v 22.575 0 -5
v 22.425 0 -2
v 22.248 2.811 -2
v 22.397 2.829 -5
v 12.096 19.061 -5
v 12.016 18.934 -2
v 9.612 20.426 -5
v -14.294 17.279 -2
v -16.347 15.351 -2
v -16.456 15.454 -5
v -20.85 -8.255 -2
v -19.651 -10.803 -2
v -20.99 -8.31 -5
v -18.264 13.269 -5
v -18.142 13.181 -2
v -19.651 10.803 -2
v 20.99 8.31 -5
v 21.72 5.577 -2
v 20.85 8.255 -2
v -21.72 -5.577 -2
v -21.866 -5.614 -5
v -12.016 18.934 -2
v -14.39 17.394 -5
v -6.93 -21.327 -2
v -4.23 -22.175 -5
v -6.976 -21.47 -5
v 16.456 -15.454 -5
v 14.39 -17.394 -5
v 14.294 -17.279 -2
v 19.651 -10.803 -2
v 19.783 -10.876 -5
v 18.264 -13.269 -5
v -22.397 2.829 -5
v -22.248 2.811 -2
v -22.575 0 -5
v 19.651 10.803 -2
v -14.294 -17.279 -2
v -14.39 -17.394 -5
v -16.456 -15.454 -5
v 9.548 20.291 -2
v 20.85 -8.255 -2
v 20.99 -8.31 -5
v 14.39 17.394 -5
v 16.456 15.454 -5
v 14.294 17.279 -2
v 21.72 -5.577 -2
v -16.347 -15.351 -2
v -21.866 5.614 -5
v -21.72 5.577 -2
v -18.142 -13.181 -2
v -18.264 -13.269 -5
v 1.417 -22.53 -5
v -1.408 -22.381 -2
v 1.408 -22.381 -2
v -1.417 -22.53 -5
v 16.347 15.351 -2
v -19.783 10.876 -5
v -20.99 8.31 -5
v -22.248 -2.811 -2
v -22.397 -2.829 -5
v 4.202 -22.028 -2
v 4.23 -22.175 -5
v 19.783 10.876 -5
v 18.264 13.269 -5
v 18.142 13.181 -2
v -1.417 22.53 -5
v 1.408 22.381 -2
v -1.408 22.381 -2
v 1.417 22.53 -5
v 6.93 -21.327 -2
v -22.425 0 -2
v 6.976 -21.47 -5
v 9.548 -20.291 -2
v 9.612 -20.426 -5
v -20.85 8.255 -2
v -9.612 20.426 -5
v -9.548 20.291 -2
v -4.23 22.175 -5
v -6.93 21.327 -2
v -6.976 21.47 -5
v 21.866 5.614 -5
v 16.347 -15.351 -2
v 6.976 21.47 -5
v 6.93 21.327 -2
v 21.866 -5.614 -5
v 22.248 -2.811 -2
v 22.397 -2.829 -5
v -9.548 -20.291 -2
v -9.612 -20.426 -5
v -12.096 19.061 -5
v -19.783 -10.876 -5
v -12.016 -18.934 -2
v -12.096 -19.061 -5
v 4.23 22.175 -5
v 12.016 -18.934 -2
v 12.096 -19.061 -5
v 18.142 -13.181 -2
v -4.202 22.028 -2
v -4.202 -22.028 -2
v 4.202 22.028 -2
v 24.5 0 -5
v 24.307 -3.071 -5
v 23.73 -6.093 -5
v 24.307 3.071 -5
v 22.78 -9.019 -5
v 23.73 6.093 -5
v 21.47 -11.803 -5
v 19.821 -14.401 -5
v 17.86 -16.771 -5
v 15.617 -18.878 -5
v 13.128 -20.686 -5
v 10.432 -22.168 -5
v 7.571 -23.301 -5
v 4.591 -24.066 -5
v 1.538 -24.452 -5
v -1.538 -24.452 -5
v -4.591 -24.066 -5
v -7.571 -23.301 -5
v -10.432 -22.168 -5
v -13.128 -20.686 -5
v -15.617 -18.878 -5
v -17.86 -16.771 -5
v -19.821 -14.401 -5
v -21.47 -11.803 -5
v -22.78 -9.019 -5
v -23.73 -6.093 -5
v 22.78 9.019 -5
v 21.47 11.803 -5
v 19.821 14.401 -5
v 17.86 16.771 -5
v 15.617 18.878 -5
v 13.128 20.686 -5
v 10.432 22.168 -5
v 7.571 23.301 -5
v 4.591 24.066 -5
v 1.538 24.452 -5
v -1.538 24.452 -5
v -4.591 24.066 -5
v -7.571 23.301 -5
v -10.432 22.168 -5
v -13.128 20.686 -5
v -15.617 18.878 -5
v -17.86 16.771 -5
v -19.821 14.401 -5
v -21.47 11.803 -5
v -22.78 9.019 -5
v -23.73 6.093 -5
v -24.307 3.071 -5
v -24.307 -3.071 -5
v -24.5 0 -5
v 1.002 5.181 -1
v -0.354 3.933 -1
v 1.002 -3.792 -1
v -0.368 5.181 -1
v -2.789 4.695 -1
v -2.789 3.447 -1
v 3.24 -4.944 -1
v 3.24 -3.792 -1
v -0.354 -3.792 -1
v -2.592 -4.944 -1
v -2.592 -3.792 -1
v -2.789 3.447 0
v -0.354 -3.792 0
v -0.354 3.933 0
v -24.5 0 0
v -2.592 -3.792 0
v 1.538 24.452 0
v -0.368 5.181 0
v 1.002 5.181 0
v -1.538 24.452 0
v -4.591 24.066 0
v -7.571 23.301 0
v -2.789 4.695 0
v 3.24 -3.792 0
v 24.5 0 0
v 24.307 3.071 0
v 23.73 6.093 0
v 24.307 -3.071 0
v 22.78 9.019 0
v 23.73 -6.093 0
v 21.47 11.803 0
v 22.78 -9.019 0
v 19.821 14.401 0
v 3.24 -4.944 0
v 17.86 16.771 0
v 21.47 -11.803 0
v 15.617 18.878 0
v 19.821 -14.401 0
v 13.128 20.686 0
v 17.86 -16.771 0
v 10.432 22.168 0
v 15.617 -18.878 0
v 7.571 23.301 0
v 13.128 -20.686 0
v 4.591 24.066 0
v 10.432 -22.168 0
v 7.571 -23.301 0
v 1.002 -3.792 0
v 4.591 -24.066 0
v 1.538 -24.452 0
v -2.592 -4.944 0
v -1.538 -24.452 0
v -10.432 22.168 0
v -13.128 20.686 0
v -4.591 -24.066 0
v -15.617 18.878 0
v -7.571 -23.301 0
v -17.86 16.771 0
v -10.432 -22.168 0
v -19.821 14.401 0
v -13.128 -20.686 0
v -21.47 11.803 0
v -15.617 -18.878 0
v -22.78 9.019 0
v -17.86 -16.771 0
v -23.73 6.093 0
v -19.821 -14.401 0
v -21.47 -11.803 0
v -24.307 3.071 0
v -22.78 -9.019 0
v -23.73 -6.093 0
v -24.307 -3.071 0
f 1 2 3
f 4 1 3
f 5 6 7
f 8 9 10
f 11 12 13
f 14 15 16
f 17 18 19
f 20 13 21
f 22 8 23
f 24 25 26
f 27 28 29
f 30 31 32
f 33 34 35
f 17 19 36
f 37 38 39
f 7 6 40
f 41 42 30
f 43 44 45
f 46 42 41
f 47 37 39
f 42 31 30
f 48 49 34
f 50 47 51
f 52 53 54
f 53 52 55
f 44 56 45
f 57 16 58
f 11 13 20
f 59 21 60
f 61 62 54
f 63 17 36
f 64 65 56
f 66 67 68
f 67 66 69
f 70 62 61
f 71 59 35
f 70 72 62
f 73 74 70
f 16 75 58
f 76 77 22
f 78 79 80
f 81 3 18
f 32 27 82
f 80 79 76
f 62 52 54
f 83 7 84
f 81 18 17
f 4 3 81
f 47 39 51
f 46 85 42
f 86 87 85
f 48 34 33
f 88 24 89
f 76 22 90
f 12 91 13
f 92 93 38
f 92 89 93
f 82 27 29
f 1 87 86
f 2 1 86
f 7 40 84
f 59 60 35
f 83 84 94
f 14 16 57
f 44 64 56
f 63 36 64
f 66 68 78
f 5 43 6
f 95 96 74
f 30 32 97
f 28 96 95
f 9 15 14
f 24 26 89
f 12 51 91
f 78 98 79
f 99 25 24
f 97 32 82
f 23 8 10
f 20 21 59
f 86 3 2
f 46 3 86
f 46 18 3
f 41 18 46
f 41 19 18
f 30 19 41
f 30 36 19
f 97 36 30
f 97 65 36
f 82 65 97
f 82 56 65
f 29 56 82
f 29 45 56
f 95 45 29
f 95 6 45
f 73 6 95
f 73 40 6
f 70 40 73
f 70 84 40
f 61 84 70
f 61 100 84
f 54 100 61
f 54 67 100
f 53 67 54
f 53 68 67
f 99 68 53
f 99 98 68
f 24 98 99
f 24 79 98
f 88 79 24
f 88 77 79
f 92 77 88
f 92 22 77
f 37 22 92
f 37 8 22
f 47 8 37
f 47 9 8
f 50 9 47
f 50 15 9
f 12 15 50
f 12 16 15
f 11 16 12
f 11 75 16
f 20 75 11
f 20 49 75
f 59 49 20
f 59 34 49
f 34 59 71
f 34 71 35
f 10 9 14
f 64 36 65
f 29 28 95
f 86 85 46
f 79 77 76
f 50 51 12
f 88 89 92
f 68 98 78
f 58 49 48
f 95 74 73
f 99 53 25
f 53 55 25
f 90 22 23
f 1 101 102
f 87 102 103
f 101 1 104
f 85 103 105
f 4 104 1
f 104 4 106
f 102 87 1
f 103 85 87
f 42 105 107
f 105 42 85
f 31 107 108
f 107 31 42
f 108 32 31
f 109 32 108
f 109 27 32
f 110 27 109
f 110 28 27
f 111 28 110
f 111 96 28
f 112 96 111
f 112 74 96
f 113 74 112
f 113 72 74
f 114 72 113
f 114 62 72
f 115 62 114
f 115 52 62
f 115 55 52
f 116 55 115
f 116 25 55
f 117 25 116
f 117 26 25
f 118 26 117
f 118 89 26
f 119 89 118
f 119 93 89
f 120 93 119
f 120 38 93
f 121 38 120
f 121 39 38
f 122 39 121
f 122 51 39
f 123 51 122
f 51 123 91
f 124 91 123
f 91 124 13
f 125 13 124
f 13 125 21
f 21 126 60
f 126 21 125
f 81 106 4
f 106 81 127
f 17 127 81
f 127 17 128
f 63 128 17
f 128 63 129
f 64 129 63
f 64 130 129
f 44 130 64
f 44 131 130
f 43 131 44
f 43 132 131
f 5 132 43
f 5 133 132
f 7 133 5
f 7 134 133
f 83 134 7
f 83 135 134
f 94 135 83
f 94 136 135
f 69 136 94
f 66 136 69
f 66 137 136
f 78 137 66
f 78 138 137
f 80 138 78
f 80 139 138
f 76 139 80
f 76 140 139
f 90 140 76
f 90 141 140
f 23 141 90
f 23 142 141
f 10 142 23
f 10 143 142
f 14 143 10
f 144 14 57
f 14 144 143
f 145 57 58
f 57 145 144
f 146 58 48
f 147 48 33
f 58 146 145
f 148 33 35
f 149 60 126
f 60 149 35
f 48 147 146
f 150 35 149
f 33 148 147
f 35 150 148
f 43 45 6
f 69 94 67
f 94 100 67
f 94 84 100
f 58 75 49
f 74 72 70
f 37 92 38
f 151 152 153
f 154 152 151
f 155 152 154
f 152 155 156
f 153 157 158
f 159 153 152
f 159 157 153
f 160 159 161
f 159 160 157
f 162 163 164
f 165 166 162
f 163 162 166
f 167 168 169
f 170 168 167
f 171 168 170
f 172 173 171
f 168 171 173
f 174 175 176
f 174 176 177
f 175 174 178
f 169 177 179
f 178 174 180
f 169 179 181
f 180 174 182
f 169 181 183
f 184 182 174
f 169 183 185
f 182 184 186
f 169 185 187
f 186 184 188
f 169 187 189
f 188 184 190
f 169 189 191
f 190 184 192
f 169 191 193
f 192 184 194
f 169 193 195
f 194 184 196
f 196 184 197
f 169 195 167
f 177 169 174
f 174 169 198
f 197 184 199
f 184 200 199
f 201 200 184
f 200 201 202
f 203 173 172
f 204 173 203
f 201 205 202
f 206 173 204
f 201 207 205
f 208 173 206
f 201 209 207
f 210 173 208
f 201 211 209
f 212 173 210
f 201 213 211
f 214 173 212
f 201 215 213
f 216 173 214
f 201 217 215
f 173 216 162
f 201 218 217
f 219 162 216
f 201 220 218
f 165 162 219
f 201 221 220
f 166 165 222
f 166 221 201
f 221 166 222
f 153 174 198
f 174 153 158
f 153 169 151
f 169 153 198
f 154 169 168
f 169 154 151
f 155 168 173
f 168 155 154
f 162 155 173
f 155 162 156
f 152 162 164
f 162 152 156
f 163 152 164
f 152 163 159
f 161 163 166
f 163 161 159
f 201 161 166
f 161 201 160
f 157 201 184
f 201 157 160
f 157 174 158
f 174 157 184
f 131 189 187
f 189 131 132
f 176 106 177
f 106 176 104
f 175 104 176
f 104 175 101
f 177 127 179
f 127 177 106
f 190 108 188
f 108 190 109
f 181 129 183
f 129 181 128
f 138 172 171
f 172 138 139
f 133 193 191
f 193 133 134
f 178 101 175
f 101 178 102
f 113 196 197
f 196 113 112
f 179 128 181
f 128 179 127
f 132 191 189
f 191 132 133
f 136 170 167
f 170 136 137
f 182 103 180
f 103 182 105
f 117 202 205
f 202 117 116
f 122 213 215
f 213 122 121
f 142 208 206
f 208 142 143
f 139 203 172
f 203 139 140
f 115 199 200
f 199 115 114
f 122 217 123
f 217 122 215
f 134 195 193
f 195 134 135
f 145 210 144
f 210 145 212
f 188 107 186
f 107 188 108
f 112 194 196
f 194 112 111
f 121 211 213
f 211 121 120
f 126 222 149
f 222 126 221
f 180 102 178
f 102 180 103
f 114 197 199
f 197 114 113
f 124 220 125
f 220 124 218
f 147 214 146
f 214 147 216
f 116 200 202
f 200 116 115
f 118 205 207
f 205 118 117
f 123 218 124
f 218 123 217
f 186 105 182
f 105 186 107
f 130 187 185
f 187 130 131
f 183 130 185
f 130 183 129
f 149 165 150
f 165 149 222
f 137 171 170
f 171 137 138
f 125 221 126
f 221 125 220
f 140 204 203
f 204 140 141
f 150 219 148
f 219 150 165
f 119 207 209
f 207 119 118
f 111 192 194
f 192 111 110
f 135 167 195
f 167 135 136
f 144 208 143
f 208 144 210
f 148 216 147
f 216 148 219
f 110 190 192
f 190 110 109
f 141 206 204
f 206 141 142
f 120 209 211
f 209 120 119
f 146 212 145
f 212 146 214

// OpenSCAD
$fn = 50;


difference() {
	union() {
		translate(v = [0, 0, -5.0000000000]) {
			cylinder(h = 5, r = 24.5000000000);
		}
	}
	union() {
		#translate(v = [0, 0, -5.0000000000]) {
			cylinder(h = 3, r1 = 22.5750000000, r2 = 22.4250000000);
		}
		translate(v = [0, 0, -1]) {
			linear_extrude(height = 1) {
				text(font = "Impact", halign = "center", size = 10, text = "1", valign = "center");
			}
		}
	}
}
